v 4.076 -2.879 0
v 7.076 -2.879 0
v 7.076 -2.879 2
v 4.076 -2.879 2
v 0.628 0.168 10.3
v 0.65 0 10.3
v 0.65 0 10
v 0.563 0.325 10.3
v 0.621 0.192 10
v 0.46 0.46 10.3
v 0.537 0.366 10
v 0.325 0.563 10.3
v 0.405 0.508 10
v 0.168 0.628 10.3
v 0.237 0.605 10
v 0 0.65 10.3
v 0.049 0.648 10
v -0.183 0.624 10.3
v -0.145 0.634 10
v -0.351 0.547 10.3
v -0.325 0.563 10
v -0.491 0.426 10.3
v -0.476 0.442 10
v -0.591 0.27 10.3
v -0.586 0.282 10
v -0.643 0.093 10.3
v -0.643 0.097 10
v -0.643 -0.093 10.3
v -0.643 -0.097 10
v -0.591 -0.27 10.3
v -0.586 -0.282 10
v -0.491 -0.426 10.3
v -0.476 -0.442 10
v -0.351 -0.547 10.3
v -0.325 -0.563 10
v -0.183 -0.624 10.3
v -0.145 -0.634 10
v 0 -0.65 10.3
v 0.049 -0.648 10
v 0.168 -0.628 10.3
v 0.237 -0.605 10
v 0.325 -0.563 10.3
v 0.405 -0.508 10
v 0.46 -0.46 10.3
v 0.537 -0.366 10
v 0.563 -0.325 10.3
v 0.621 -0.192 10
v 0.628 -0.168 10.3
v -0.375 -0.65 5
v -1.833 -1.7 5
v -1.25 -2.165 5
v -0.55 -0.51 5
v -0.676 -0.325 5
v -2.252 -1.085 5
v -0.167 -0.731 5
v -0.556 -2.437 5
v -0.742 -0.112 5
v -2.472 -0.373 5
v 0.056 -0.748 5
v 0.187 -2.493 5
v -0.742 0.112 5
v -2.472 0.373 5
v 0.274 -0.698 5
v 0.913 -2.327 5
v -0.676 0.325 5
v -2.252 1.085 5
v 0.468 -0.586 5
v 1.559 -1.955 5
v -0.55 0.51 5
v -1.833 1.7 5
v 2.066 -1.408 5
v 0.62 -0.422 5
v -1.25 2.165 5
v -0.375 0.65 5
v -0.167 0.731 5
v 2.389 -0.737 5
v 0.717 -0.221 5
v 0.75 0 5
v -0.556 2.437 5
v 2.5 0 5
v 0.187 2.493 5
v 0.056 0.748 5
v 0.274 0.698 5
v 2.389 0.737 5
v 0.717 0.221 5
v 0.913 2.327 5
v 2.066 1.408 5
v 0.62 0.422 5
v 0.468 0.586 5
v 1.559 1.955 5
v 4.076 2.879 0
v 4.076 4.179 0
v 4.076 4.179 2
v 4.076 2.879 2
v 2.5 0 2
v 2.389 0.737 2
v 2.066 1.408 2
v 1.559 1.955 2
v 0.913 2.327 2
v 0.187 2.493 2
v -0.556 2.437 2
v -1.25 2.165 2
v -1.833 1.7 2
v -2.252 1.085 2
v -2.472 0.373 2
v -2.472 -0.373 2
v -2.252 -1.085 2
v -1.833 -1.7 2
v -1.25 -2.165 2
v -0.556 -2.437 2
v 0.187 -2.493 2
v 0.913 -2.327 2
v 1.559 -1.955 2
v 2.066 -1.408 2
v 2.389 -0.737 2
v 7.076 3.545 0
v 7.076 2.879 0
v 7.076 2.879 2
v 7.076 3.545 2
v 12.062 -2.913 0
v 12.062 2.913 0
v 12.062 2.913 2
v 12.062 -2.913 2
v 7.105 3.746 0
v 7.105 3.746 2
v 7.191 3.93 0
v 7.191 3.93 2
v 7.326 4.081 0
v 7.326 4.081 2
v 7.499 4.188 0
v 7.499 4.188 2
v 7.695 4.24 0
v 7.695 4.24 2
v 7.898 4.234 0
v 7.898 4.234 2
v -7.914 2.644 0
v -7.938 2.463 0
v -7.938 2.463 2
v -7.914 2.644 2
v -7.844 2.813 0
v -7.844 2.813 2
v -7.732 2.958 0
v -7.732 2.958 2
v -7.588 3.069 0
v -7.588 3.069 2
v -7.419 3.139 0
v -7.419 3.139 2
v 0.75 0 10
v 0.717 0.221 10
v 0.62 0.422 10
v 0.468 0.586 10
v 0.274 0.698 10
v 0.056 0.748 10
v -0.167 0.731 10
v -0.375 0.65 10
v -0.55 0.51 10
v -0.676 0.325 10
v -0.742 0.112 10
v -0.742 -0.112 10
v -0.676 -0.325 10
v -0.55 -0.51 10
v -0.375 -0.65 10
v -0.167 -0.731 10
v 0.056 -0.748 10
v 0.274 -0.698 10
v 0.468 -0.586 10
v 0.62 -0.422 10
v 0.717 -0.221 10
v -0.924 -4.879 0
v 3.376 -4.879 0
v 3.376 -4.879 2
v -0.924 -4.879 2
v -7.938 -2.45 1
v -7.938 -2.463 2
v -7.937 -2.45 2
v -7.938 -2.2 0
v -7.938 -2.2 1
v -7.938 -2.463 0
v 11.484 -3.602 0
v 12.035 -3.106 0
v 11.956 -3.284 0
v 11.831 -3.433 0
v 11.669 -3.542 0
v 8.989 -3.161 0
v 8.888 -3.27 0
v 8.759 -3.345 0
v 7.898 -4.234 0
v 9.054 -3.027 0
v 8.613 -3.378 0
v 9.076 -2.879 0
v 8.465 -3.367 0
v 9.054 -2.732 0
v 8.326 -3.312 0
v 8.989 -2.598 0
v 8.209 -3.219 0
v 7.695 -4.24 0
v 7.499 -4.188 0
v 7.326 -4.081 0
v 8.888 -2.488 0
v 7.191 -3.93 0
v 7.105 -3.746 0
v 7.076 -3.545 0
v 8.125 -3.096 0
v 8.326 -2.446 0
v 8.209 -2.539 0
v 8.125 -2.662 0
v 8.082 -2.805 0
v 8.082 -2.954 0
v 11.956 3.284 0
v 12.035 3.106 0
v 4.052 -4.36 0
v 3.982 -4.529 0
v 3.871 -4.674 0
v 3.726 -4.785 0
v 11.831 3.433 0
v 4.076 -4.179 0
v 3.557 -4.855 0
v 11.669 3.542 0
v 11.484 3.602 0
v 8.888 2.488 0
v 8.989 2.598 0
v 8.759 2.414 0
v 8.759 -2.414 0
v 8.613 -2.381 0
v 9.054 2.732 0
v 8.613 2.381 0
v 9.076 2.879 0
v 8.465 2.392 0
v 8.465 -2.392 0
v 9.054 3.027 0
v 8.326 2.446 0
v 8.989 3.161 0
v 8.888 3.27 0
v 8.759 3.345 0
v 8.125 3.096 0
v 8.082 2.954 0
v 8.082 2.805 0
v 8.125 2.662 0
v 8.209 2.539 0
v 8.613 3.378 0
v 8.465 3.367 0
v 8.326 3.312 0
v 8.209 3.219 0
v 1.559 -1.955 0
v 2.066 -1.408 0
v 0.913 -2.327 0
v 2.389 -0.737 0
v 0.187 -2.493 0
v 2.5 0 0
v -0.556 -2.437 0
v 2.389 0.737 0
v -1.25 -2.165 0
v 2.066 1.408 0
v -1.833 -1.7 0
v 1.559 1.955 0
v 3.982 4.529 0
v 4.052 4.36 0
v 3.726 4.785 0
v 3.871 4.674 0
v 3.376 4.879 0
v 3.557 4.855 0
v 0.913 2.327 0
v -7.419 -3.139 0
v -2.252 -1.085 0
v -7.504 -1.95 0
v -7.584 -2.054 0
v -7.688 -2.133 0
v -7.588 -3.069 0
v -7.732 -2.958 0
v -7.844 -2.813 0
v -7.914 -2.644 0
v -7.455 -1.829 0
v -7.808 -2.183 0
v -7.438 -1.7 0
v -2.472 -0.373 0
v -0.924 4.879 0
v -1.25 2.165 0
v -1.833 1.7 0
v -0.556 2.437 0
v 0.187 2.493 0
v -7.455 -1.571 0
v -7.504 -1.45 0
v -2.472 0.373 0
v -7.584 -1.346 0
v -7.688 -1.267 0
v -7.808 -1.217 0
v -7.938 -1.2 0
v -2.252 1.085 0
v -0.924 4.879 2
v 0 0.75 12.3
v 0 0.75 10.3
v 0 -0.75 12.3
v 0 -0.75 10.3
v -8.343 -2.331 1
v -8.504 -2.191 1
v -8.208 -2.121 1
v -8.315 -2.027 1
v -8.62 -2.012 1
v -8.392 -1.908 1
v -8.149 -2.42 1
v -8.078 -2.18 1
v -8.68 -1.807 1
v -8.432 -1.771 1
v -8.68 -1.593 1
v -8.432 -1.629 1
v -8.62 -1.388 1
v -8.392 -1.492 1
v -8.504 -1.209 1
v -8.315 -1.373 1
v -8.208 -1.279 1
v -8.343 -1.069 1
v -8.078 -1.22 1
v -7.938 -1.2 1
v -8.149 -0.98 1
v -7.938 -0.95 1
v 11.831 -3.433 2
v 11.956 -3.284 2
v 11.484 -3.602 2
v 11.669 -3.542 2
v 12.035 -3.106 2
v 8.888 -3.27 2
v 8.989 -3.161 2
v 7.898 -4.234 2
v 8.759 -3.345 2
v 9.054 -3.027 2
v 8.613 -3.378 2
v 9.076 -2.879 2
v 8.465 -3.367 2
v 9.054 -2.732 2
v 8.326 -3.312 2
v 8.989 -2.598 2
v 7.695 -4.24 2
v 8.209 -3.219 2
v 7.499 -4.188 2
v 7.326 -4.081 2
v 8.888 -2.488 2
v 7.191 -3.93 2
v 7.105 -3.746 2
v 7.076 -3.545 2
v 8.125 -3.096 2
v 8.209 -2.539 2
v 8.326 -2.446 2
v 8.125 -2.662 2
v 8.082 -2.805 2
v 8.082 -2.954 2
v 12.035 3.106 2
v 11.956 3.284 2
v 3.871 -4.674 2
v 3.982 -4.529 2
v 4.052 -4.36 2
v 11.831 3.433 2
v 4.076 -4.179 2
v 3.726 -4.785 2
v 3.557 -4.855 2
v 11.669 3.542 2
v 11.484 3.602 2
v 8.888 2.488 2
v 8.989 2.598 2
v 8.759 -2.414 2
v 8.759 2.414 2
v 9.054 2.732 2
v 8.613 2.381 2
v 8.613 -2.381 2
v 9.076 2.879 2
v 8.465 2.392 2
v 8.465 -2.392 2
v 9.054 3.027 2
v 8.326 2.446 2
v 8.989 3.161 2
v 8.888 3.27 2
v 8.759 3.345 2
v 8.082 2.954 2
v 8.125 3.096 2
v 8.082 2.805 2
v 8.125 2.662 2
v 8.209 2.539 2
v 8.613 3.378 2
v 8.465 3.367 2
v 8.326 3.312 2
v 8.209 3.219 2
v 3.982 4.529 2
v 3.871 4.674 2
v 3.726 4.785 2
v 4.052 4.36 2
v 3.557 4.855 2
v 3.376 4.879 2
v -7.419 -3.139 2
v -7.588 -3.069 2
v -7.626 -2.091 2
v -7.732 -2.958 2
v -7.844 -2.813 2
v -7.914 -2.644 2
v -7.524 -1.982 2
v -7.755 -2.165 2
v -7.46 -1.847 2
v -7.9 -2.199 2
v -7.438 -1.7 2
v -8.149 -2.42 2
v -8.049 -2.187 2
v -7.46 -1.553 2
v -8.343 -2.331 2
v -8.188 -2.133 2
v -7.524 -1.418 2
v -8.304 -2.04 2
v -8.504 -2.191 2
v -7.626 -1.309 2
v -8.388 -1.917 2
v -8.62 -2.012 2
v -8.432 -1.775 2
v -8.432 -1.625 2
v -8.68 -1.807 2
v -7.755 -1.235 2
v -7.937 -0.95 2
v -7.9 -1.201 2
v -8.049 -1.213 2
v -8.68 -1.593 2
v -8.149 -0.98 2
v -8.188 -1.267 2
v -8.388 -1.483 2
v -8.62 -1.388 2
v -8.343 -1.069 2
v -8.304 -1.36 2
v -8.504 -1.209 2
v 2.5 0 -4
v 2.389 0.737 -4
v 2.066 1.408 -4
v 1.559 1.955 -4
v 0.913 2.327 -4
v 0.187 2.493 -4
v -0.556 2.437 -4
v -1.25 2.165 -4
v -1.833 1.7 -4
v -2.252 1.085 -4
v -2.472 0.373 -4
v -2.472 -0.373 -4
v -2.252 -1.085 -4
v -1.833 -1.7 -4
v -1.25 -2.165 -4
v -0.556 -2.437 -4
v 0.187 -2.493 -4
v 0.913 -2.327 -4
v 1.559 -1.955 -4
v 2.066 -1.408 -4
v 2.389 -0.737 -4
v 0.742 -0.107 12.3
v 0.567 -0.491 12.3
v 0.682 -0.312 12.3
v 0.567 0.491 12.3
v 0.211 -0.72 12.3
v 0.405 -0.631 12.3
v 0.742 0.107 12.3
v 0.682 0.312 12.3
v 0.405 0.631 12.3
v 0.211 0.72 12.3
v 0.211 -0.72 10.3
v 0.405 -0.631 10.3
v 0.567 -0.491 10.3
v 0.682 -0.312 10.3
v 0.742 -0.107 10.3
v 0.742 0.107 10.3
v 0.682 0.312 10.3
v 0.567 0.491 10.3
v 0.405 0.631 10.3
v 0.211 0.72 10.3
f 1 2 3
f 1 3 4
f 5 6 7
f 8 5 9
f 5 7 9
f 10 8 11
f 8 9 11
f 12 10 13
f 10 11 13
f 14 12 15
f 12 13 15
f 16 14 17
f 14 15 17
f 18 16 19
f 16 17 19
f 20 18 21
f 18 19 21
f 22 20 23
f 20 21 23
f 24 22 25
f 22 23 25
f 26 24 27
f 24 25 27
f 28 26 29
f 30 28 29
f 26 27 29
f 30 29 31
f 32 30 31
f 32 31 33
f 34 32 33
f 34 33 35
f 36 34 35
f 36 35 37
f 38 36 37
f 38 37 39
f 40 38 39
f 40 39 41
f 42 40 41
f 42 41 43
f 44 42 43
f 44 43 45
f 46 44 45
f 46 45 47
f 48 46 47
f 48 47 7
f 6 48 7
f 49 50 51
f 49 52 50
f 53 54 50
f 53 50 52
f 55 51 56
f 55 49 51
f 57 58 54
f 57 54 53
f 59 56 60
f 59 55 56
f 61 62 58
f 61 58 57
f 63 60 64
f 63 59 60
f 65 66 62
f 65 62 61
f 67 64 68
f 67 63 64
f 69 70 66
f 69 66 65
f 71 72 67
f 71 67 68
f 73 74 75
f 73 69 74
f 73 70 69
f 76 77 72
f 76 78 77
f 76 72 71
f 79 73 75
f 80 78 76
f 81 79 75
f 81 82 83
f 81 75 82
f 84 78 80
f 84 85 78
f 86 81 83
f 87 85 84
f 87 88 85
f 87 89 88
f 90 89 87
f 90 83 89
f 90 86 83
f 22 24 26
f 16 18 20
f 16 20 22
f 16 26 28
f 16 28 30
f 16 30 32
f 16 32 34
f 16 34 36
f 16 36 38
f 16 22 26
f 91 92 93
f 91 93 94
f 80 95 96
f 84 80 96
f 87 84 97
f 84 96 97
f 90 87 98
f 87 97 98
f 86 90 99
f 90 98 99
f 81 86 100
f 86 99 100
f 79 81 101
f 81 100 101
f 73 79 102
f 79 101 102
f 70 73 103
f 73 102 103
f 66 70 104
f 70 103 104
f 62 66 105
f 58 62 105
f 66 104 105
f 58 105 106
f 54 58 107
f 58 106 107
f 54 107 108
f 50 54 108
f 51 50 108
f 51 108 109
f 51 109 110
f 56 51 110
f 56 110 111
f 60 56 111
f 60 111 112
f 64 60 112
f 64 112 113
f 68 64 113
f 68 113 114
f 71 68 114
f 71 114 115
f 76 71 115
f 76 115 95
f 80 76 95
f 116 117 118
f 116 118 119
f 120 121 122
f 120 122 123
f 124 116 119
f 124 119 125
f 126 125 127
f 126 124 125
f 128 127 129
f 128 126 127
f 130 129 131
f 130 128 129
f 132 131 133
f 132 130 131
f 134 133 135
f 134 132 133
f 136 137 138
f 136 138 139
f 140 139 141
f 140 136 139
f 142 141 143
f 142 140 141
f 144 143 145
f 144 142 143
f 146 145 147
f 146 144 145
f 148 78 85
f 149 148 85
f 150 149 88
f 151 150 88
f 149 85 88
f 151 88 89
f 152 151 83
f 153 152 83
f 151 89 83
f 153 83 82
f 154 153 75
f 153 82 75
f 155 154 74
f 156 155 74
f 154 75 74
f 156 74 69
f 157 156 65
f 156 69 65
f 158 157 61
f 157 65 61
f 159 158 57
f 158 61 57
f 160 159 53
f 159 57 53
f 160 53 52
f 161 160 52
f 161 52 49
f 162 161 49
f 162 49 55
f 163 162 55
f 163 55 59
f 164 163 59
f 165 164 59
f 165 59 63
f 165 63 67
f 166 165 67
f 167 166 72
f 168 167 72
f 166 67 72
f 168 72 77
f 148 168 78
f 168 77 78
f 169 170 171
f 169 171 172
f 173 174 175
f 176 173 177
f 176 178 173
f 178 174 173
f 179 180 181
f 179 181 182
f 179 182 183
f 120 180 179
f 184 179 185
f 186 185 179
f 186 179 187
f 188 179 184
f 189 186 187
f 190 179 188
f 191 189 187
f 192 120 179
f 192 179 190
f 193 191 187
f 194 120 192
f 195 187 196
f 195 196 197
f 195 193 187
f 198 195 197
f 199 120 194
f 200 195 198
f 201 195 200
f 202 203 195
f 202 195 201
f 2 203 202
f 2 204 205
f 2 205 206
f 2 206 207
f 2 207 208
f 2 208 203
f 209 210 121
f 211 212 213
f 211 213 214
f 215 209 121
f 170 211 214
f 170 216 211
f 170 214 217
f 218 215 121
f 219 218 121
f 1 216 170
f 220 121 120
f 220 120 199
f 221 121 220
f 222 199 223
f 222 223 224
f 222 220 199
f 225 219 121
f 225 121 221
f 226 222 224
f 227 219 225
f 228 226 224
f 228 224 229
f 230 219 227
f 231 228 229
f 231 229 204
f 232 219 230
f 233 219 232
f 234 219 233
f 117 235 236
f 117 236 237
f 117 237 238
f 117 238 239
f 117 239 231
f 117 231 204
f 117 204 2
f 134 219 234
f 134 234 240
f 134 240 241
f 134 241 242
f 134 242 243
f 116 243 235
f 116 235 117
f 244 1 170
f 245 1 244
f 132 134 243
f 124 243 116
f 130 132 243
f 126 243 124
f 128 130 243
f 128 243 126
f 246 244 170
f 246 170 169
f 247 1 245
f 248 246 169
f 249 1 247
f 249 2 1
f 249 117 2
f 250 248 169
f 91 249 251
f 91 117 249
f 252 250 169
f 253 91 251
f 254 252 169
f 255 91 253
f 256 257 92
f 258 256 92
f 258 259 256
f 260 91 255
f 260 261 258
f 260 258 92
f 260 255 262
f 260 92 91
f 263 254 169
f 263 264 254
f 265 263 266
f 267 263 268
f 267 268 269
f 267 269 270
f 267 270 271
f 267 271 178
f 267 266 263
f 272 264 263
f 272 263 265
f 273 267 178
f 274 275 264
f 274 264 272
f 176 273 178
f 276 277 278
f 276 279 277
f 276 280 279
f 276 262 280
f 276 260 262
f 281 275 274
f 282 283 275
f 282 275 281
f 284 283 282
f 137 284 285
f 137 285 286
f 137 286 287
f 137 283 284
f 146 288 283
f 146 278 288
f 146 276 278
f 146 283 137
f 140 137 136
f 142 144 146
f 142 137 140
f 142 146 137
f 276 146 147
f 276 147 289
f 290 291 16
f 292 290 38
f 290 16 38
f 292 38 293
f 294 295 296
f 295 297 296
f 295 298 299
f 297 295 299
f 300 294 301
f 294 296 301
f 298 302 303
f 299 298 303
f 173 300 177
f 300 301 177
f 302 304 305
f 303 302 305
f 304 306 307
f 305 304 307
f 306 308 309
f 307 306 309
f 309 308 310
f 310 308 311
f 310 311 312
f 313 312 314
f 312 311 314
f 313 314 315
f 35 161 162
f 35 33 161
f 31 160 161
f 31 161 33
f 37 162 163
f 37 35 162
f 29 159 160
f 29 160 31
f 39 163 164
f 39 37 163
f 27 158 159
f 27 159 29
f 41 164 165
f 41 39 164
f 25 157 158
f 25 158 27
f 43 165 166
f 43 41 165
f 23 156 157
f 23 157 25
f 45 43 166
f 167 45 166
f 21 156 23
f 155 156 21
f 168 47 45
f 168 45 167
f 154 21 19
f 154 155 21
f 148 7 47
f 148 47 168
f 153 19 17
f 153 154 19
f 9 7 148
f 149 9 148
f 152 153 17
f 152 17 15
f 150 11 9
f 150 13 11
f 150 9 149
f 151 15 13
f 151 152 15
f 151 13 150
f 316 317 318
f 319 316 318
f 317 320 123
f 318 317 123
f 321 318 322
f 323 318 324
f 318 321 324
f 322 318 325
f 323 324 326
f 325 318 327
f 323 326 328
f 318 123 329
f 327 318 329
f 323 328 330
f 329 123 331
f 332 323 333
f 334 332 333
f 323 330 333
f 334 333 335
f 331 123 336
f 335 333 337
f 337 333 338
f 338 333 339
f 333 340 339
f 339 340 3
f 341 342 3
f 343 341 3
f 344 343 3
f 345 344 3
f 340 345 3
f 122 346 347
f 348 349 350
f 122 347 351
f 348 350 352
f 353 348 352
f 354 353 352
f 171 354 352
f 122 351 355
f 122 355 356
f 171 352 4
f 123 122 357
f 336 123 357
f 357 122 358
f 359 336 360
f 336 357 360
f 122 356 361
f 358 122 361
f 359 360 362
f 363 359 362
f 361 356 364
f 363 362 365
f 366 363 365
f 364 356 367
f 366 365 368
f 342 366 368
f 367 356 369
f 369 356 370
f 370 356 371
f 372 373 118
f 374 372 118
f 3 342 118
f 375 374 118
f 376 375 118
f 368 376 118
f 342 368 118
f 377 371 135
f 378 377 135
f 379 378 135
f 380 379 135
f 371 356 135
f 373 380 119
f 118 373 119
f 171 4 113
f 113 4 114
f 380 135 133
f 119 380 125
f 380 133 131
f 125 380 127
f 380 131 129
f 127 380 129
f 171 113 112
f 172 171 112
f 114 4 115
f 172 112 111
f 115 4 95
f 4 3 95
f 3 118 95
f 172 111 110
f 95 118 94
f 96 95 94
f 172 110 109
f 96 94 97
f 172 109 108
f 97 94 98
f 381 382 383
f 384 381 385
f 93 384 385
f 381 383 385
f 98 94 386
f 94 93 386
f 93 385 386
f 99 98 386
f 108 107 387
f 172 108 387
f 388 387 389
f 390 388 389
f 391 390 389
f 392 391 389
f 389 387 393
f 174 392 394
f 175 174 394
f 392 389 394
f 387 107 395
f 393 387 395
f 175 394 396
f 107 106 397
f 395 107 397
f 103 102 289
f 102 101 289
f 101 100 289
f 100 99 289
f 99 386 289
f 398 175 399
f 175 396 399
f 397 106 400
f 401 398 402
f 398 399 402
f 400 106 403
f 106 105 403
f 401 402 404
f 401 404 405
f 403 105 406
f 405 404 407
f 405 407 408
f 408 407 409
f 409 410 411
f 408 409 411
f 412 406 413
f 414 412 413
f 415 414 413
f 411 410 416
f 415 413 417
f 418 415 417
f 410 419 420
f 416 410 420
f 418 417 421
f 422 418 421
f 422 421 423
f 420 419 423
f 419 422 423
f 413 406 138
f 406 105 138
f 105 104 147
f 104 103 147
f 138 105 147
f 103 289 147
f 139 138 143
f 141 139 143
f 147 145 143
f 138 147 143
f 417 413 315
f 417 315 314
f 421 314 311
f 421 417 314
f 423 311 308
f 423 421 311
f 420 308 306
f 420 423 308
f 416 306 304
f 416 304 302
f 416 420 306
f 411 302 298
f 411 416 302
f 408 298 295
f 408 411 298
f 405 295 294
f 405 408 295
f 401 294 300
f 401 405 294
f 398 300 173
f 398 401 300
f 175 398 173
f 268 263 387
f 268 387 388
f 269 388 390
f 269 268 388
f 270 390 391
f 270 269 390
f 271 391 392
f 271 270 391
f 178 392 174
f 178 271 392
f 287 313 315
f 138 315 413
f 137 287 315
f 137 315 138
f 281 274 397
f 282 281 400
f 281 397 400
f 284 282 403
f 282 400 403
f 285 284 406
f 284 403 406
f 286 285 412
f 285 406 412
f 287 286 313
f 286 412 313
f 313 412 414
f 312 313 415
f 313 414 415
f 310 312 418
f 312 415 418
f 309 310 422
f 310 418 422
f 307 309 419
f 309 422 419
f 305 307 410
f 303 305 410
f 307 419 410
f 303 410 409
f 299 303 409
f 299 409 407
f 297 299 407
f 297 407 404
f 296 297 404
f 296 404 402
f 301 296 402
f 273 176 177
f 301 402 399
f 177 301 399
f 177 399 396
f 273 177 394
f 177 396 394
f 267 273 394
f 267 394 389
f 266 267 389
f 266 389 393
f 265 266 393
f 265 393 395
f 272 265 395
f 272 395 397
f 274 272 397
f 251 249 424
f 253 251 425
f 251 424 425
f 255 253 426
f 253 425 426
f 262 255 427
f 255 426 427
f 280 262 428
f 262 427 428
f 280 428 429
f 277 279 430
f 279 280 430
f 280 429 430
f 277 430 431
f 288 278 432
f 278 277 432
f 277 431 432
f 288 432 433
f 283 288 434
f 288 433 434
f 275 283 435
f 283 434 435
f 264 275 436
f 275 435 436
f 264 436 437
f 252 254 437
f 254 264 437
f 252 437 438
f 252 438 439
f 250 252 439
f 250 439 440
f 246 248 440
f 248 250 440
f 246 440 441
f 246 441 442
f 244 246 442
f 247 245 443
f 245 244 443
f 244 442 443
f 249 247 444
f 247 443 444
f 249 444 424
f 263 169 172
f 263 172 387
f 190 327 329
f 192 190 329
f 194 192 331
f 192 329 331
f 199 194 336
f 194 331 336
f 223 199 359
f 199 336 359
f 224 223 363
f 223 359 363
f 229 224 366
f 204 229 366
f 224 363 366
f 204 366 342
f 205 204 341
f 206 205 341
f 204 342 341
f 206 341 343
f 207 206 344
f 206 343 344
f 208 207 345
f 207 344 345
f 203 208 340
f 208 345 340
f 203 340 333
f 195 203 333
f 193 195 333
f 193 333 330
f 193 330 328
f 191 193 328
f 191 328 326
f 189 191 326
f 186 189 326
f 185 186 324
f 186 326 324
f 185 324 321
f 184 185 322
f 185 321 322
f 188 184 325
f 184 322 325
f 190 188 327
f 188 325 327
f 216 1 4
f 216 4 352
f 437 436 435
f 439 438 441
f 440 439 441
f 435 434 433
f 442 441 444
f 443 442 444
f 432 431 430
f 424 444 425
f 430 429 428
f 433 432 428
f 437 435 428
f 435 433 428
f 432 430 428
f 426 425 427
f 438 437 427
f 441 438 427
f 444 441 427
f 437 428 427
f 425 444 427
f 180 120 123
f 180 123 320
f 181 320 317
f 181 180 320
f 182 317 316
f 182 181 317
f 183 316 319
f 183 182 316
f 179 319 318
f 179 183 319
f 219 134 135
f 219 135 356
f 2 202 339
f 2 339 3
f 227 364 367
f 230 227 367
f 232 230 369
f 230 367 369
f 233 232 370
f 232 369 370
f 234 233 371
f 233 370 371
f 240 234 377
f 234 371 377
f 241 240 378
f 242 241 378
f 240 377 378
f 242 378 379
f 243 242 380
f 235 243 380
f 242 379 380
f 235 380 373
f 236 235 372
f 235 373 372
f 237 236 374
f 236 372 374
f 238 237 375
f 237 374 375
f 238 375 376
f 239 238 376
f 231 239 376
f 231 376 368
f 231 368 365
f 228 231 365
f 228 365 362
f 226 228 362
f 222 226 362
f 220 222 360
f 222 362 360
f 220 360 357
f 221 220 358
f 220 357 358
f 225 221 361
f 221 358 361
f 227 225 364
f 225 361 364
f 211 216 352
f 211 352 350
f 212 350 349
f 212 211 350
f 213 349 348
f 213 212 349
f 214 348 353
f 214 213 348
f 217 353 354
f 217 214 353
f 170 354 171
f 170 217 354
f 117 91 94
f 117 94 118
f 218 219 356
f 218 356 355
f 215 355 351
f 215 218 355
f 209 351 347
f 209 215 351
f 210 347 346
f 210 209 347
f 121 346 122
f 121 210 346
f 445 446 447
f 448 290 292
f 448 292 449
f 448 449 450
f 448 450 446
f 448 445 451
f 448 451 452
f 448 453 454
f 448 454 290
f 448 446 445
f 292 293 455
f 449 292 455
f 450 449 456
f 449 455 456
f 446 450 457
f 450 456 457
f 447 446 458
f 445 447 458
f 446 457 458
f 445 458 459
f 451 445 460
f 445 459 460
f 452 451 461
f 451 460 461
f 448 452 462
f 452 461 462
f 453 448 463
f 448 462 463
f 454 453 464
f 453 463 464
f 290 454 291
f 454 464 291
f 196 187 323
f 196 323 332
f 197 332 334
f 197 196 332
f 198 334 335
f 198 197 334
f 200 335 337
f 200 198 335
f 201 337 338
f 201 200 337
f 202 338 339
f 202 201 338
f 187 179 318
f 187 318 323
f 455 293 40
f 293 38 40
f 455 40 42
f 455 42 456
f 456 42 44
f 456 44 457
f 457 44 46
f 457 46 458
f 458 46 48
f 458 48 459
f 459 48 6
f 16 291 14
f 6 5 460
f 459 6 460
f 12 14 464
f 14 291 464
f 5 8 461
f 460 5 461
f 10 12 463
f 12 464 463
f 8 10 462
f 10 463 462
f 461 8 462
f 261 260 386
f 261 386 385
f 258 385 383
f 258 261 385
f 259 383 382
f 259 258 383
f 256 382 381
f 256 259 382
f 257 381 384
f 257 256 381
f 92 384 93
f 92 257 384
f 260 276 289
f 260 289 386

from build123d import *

# Parameters (mm, degrees)
BOSS_EXTRUDE1_DEPTH      = 2
SKETCH3_R                = 0.5
CUT_EXTRUDE1_DEPTH       = 2
SKETCH4_R                = 0.75
BOSS_EXTRUDE2_DEPTH      = 1
SKETCH5_R                = 0.5
CUT_EXTRUDE2_DEPTH       = 2
BOSS_EXTRUDE3_DEPTH      = 3
BOSS_EXTRUDE3_DEPTH_BACK = 6
SKETCH6_R                = 2.5
SKETCH7_R                = 0.75
BOSS_EXTRUDE4_DEPTH      = 5
SKETCH9_R                = 0.65
BOSS_EXTRUDE5_DEPTH      = 0.3
BOSS_EXTRUDE6_DEPTH      = 2


with BuildPart() as part:
    # Sketch2 → Boss-Extrude1 (new body)
    with BuildSketch(Plane.XY):
        with BuildLine():
            Line((-7.9375, -2.462871108), (-7.9375, 2.462871108))
            ThreePointArc((-7.9375, 2.462871108), (-7.792847338, 2.889004109), (-7.418673332, 3.139019187))
            Line((-7.418673332, 3.139019187), (-0.924016143, 4.879257336))
            Line((-0.924016143, 4.879257336), (3.375983857, 4.879257336))
            ThreePointArc((3.375983857, 4.879257336), (3.870958604, 4.674232083), (4.075983857, 4.179257336))
            Line((4.075983857, 4.179257336), (4.075983857, 2.879257336))
            Line((4.075983857, 2.879257336), (7.075983857, 2.879257336))
            Line((7.075983857, 2.879257336), (7.075983857, 3.545029821))
            ThreePointArc((7.075983857, 3.545029821), (7.326032531, 4.081260931), (7.897537582, 4.234395248))
            Line((7.897537582, 4.234395248), (11.484053724, 3.601995685))
            ThreePointArc((11.484053724, 3.601995685), (11.89873111, 3.362581585), (12.0625, 2.912630258))
            Line((12.0625, 2.912630258), (12.0625, -2.912630258))
            ThreePointArc((12.0625, -2.912630258), (11.89873111, -3.362581585), (11.484053724, -3.601995685))
            Line((11.484053724, -3.601995685), (7.897537582, -4.234395248))
            ThreePointArc((7.897537582, -4.234395248), (7.326032531, -4.081260931), (7.075983857, -3.545029821))
            Line((7.075983857, -3.545029821), (7.075983857, -2.879257336))
            Line((7.075983857, -2.879257336), (4.075983857, -2.879257336))
            Line((4.075983857, -2.879257336), (4.075983857, -4.179257336))
            ThreePointArc((4.075983857, -4.179257336), (3.870958604, -4.674232083), (3.375983857, -4.879257336))
            Line((3.375983857, -4.879257336), (-0.924016143, -4.879257336))
            Line((-0.924016143, -4.879257336), (-7.418673332, -3.139019187))
            ThreePointArc((-7.418673332, -3.139019187), (-7.792847338, -2.889004109), (-7.9375, -2.462871108))
        make_face()
    extrude(amount=BOSS_EXTRUDE1_DEPTH)

    # Sketch3 → Cut-Extrude1 (cut)
    with BuildSketch(Plane.XY.offset(2)):
        with Locations((8.575983857, 2.879257336)):
            Circle(SKETCH3_R)
        with Locations((8.575983857, -2.879257336)):
            Circle(SKETCH3_R)
    extrude(amount=-CUT_EXTRUDE1_DEPTH, mode=Mode.SUBTRACT)

    # Sketch4 → Boss-Extrude2 (add)
    with BuildSketch(Plane.XY.offset(2)):
        with Locations((-7.9375, -1.7)):
            Circle(SKETCH4_R)
    extrude(amount=-BOSS_EXTRUDE2_DEPTH)

    # Sketch5 → Cut-Extrude2 (cut)
    with BuildSketch(Plane.XY.offset(2)):
        with Locations((-7.9375, -1.7)):
            Circle(SKETCH5_R)
    extrude(amount=-CUT_EXTRUDE2_DEPTH, mode=Mode.SUBTRACT)

    # Sketch6 → Boss-Extrude3 (add, two sides: drawn at the far end of the back side and taken through both)
    with BuildSketch(Plane.XY.offset(2).offset(-BOSS_EXTRUDE3_DEPTH_BACK)):
        Circle(SKETCH6_R)
    extrude(amount=BOSS_EXTRUDE3_DEPTH + BOSS_EXTRUDE3_DEPTH_BACK)

    # Sketch7 → Boss-Extrude4 (add)
    with BuildSketch(Plane.XY.offset(5)):
        Circle(SKETCH7_R)
    extrude(amount=BOSS_EXTRUDE4_DEPTH)

    # Sketch9 → Boss-Extrude5 (add)
    with BuildSketch(Plane.XY.offset(10)):
        Circle(SKETCH9_R)
    extrude(amount=BOSS_EXTRUDE5_DEPTH)

    # Sketch10 → Boss-Extrude6 (add)
    with BuildSketch(Plane.XY.offset(10.3)):
        with BuildLine():
            Line((0, 0.75), (0, -0.75))
            ThreePointArc((0, -0.75), (0.75, 0), (0, 0.75))
        make_face()
    extrude(amount=BOSS_EXTRUDE6_DEPTH)


solid = part.part
